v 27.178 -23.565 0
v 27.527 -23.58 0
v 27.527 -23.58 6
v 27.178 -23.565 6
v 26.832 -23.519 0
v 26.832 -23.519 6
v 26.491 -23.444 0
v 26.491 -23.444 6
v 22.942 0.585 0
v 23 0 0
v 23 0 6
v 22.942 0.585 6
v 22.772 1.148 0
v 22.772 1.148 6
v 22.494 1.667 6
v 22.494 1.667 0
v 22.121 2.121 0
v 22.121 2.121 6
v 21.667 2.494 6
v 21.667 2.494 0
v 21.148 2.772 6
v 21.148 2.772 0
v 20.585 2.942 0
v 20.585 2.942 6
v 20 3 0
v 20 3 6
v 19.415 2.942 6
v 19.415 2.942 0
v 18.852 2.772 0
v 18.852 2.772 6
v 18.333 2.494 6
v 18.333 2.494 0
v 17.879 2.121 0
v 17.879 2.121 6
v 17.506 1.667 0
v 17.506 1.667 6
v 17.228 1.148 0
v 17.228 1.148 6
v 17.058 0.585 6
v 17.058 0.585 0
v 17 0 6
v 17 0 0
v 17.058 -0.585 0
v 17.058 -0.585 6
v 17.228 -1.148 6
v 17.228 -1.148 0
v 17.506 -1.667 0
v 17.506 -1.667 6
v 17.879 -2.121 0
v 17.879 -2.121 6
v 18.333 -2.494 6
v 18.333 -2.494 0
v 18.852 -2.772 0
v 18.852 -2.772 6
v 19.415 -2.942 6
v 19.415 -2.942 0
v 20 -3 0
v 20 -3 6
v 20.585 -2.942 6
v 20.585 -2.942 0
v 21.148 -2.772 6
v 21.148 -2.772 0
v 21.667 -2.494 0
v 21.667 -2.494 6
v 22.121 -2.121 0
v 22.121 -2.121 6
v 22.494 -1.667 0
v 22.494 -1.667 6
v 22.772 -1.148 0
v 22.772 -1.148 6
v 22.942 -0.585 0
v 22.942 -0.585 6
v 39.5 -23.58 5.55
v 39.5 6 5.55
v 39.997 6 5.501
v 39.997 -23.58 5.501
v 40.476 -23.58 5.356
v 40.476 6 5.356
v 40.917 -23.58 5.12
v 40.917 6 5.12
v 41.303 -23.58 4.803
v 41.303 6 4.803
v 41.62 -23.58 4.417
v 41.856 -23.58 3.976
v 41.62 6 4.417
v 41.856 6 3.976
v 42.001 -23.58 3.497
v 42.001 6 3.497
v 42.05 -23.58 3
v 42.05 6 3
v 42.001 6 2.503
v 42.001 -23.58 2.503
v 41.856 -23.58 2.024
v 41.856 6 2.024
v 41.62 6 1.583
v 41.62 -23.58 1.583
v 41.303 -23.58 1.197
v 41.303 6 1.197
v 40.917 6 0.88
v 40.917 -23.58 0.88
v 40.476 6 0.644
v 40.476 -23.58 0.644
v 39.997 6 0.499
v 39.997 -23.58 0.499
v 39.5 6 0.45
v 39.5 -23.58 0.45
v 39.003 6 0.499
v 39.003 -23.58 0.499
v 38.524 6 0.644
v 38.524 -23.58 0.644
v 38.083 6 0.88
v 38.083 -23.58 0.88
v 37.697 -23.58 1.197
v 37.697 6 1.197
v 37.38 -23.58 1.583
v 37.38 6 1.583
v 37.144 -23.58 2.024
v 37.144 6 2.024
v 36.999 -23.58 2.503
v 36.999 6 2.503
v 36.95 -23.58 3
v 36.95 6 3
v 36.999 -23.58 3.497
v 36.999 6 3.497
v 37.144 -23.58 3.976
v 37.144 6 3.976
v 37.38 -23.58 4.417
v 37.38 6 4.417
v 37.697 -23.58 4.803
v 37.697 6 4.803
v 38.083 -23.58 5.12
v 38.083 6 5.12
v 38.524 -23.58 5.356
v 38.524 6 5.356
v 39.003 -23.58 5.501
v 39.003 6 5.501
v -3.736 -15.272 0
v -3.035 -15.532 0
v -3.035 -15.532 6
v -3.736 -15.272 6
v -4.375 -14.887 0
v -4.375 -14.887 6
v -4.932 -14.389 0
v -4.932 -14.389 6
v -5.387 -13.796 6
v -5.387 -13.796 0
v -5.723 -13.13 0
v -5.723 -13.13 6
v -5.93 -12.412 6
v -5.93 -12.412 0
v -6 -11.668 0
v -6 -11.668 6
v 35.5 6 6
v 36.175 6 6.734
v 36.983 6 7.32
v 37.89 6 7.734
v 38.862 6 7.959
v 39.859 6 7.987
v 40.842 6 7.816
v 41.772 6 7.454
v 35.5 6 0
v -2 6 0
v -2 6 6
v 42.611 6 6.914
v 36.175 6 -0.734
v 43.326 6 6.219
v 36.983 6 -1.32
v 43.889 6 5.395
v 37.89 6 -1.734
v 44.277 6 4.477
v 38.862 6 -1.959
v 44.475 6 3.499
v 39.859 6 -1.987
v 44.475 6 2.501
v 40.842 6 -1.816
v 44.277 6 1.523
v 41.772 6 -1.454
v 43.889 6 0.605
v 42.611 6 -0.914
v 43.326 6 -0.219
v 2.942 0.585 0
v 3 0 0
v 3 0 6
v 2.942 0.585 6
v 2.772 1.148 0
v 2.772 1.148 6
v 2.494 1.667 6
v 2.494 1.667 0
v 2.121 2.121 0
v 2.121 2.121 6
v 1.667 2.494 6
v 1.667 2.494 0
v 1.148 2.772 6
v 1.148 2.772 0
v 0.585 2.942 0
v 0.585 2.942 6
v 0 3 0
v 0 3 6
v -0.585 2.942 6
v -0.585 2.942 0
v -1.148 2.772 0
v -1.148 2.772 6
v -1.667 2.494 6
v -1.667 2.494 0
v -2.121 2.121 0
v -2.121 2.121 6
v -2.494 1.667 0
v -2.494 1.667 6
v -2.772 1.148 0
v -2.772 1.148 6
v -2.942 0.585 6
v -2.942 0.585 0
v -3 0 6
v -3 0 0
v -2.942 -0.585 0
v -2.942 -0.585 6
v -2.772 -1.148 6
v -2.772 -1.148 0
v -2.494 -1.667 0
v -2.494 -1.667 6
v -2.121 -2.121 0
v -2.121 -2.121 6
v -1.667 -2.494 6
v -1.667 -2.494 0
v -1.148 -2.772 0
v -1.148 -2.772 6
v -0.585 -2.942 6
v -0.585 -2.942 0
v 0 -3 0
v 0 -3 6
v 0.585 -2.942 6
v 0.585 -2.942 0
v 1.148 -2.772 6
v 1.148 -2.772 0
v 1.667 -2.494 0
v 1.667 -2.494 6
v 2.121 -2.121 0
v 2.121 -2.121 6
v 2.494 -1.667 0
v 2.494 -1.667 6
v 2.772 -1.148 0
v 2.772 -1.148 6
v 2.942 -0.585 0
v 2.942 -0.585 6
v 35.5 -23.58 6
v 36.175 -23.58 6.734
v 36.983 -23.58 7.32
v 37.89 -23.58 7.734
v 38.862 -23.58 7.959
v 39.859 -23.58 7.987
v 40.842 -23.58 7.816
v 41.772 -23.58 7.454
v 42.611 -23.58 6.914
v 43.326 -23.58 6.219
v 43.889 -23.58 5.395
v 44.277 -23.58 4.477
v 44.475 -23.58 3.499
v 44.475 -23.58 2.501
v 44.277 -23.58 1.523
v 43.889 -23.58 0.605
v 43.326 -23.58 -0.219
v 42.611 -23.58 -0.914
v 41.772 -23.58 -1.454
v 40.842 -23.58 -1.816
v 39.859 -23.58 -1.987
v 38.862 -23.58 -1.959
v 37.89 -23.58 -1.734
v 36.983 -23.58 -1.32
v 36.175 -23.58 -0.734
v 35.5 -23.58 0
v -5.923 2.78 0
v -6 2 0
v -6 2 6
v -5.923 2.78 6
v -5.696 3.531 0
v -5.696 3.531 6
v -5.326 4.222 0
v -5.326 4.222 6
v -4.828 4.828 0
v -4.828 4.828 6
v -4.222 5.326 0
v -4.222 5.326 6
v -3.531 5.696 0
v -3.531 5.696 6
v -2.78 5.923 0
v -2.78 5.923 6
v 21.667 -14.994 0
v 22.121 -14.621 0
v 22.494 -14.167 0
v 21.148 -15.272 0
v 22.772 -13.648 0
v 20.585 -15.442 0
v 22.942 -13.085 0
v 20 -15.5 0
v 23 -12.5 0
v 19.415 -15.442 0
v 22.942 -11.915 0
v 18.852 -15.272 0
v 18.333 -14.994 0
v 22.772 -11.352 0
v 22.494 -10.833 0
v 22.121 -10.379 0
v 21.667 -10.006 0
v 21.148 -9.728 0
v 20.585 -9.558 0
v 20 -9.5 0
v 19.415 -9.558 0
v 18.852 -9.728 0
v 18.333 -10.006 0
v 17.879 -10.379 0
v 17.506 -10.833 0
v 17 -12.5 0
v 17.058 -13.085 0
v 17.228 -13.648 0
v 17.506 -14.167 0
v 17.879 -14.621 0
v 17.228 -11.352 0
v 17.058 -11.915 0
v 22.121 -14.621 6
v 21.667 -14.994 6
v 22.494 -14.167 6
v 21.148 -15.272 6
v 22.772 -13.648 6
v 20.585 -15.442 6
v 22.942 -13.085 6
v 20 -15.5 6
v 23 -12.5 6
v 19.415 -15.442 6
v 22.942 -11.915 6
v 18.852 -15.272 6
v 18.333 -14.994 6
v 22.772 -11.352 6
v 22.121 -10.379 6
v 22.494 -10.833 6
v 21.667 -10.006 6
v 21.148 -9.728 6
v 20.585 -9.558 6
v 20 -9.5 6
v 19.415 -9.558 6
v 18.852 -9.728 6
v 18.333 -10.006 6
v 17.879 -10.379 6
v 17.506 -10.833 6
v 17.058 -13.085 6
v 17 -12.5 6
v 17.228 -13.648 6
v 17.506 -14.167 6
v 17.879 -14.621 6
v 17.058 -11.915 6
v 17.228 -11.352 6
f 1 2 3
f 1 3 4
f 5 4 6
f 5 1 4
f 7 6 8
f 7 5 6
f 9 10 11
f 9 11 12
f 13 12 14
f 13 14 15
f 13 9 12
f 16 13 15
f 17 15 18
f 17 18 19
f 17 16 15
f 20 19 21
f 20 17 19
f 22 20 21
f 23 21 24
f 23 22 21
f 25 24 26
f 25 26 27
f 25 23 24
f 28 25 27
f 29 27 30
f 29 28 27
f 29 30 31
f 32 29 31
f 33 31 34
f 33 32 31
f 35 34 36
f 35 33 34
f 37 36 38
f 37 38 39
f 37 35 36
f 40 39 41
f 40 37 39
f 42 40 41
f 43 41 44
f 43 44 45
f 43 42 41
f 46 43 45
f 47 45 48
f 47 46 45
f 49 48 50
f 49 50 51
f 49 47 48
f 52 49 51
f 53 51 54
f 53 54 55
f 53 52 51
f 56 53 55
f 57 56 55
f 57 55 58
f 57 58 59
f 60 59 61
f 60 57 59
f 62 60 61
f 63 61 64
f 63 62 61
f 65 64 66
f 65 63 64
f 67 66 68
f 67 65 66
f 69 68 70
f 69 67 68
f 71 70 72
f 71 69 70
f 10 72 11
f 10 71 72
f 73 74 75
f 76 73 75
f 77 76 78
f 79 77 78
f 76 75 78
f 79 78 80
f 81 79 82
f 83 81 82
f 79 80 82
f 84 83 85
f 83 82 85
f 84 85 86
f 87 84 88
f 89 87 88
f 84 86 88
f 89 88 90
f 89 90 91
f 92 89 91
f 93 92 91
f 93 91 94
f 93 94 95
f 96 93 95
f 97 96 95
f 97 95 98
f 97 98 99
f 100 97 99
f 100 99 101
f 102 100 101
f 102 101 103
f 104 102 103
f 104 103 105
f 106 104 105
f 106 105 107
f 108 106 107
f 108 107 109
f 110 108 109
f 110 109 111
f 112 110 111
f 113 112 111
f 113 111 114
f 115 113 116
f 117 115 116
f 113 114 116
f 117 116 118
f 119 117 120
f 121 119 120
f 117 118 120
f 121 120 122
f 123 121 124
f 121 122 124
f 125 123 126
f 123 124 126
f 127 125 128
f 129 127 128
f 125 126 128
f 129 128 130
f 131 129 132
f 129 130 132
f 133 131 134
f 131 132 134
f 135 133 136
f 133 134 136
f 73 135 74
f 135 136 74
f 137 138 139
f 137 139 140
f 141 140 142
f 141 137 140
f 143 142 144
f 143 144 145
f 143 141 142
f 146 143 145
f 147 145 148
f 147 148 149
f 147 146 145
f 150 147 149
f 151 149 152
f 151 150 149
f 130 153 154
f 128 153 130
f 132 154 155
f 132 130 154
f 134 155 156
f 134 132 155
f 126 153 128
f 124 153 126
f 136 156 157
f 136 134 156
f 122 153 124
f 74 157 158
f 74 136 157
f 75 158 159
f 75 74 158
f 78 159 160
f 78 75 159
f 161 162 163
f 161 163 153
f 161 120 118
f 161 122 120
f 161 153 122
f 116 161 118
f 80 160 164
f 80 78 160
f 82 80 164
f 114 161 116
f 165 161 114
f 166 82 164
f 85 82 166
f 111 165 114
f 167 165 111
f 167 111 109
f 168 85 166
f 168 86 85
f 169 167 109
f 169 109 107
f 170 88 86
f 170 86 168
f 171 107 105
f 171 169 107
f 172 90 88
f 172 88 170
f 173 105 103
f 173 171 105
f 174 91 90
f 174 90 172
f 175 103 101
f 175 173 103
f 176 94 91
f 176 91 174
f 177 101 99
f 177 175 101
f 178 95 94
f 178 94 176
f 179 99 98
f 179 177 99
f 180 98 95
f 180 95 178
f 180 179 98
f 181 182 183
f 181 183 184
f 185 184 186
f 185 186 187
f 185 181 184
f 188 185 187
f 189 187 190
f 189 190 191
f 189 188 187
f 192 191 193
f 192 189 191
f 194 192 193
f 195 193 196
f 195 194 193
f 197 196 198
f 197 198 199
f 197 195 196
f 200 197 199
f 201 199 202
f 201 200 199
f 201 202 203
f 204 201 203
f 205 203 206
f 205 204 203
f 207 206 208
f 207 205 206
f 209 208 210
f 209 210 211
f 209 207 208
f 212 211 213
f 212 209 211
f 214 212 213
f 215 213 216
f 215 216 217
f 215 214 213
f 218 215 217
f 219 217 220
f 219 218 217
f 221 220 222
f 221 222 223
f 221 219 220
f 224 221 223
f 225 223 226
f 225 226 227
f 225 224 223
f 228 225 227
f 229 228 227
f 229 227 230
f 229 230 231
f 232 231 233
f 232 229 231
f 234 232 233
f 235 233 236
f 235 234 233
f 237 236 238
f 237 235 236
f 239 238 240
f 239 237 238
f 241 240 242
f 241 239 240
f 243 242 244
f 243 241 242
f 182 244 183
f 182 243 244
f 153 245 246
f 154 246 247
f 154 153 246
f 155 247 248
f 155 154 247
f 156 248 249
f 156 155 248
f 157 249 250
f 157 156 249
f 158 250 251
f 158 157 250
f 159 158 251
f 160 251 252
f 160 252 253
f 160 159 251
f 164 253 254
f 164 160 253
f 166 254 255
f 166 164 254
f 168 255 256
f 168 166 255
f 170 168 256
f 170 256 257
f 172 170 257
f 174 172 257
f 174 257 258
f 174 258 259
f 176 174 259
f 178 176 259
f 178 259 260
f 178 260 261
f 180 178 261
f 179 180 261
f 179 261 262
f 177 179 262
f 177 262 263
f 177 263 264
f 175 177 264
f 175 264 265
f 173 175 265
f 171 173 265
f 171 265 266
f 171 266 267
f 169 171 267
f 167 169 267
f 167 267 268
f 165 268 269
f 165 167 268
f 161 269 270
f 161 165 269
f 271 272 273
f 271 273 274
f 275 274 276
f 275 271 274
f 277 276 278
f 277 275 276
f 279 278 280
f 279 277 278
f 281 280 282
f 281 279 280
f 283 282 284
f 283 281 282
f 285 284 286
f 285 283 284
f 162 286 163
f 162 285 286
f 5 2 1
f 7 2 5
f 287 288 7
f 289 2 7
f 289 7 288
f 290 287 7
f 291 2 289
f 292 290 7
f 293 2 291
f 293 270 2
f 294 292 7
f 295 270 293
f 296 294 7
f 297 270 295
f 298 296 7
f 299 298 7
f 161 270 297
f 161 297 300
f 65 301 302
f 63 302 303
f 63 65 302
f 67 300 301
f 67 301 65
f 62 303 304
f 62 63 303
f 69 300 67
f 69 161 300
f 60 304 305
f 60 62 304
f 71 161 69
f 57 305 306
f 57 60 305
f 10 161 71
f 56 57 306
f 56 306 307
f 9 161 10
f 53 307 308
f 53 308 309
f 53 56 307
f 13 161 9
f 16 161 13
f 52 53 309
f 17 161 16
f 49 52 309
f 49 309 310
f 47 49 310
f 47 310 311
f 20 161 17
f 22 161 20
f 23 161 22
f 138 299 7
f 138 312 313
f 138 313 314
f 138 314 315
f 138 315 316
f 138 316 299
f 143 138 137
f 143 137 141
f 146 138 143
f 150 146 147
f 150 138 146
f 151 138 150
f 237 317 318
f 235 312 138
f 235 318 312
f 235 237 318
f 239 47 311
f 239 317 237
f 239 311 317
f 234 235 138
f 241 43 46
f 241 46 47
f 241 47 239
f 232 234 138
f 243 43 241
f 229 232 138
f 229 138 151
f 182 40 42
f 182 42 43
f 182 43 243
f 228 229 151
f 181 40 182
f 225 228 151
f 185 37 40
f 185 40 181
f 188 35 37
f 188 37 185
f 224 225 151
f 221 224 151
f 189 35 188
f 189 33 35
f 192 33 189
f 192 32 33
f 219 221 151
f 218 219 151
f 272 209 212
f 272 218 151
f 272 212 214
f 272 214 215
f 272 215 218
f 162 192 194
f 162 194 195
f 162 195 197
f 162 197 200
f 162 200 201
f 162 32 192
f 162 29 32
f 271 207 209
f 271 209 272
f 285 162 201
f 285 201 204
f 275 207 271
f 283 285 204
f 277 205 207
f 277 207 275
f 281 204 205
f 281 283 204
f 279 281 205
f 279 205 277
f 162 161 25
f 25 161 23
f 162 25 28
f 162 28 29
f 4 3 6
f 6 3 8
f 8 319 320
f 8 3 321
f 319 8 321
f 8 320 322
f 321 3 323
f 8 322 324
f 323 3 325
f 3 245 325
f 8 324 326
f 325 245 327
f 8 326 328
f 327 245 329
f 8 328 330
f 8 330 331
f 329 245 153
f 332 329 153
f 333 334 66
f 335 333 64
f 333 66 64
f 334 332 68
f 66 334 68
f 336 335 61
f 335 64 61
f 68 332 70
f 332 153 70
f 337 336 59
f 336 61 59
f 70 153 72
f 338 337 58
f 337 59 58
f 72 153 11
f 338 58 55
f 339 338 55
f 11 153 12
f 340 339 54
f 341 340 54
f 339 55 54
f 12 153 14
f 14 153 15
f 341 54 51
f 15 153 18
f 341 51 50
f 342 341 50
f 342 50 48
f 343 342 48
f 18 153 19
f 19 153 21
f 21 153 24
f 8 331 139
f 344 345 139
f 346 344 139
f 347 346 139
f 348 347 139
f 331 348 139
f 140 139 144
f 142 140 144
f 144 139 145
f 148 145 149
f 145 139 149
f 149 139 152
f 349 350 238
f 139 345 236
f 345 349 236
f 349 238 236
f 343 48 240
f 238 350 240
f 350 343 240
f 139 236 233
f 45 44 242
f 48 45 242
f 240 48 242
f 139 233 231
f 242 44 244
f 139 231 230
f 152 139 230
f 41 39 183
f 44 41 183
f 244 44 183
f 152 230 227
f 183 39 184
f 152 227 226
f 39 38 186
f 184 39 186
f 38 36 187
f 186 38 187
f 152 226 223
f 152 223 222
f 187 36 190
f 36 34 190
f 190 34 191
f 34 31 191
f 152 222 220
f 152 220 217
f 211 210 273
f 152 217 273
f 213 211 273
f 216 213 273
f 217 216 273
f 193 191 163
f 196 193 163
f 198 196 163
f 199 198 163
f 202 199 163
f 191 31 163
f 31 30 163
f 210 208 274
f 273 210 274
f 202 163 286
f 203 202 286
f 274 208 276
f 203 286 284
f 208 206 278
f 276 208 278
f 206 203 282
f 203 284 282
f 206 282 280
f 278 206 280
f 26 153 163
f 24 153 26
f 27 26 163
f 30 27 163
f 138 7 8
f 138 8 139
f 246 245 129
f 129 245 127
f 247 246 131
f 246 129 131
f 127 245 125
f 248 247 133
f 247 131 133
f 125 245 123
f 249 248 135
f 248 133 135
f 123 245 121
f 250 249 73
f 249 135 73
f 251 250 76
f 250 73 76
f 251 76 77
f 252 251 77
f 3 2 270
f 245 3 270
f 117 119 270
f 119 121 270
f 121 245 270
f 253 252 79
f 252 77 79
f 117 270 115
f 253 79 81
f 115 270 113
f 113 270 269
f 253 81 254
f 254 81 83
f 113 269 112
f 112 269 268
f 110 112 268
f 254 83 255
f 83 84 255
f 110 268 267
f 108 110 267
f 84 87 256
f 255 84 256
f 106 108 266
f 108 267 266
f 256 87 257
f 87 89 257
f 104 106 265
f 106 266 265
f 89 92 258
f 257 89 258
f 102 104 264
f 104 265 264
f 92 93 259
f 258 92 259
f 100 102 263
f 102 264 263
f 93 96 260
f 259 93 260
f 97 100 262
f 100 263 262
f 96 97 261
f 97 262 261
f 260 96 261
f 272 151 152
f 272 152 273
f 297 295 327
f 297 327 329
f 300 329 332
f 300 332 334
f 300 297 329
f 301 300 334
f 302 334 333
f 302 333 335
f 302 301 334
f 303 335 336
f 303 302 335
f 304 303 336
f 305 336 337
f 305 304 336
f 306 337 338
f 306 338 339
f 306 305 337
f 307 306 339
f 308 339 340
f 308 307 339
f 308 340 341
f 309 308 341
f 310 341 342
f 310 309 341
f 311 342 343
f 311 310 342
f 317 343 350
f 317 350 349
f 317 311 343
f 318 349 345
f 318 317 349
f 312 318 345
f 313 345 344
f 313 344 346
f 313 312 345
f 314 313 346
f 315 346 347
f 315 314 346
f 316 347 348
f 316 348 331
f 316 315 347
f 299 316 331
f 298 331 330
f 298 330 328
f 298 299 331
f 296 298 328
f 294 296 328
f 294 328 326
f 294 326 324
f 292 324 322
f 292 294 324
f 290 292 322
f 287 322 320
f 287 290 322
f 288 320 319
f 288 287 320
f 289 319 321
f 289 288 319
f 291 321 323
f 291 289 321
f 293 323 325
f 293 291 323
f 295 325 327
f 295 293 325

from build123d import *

# Parameters (mm, degrees)
SKETCH_2_R          = 3
EXTRUDE_1_DEPTH     = 6
SKETCH_3_R          = 5
EXTRUDE_2_DEPTH     = 29.58
SKETCH_4_R          = 2.55
CUT_EXTRUDE_1_DEPTH = 55.029865815


with BuildPart() as part:
    # 草图2 → 凸台-拉伸1 (new body)
    with BuildSketch(Plane.XY):
        with BuildLine():
            Line((26.49133381, -23.443703305), (-3.03527618, -15.532072003))
            ThreePointArc((-3.03527618, -15.532072003), (-5.173413361, -14.103414414), (-6, -11.668368698))
            Line((-6, -11.668368698), (-6, 2))
            ThreePointArc((-6, 2), (-4.828427125, 4.828427125), (-2, 6))
            Line((-2, 6), (39.5, 6))
            Line((39.5, 6), (39.5, -23.58))
            Line((39.5, -23.58), (27.52660999, -23.58))
            ThreePointArc((27.52660999, -23.58), (27.004505221, -23.545779445), (26.49133381, -23.443703305))
        make_face()
        Circle(SKETCH_2_R, mode=Mode.SUBTRACT)
        with Locations((20, 0)):
            Circle(SKETCH_2_R, mode=Mode.SUBTRACT)
        with Locations((20, -12.5)):
            Circle(SKETCH_2_R, mode=Mode.SUBTRACT)
    extrude(amount=EXTRUDE_1_DEPTH)

    # 草图3 → 凸台-拉伸2 (add, through all)
    with BuildSketch(Plane(origin=(0, 6, 0), x_dir=(1, 0, 0), z_dir=(0, 1, 0))):
        with Locations((39.5, -3)):
            Circle(SKETCH_3_R)
    extrude(amount=-EXTRUDE_2_DEPTH)

    # 草图4 → 切除-拉伸1 (cut, through all)
    with BuildSketch(Plane(origin=(0, 6, 0), x_dir=(1, 0, 0), z_dir=(0, 1, 0))):
        with Locations(Location((39.5, -3, 0), (0, 0, 270))):
            Circle(SKETCH_4_R)
    extrude(amount=-CUT_EXTRUDE_1_DEPTH, mode=Mode.SUBTRACT)


solid = part.part
